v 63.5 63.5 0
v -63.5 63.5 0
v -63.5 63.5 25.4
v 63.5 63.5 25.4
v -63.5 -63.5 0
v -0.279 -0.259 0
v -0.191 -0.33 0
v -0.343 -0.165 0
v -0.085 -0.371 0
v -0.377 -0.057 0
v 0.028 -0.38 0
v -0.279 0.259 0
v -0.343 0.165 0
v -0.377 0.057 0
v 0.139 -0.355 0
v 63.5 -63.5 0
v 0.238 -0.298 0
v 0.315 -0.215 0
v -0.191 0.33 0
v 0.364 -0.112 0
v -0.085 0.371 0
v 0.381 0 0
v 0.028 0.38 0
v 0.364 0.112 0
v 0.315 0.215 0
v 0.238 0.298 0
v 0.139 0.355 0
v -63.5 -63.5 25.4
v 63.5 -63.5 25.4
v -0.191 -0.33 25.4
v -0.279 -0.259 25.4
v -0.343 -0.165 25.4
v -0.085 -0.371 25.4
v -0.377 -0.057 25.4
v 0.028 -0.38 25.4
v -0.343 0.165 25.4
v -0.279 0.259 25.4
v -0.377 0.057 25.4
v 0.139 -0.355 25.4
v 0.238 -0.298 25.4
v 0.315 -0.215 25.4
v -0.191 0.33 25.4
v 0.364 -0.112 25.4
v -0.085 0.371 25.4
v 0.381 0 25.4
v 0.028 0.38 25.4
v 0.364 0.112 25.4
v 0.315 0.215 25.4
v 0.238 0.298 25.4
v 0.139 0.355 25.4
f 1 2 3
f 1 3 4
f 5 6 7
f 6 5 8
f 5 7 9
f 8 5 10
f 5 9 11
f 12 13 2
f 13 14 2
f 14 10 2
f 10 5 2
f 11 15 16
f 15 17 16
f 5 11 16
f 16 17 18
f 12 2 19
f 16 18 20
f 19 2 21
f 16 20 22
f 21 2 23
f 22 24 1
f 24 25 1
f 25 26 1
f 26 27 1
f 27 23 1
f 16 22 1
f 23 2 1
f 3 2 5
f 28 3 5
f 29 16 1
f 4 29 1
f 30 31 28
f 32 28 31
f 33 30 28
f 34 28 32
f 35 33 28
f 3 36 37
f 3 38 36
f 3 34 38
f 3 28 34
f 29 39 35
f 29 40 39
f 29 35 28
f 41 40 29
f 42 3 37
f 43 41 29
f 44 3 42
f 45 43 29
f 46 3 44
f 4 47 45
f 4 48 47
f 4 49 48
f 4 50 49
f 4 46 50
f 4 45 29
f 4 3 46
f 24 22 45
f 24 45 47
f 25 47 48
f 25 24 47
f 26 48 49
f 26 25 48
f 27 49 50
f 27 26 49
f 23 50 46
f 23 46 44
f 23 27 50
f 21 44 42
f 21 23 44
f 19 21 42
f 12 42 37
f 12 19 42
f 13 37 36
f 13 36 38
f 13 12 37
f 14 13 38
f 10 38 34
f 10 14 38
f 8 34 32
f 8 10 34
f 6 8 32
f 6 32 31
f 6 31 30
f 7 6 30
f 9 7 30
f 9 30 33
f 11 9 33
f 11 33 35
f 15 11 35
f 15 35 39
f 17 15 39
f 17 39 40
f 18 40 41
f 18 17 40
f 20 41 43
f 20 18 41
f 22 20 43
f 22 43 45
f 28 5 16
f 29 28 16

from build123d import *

# Parameters (mm, degrees)
F0_W     = 127
F0_H     = 25.4
F0_H_2   = 76.2
F0_R     = 0.381
F1_DEPTH = 25.4


with BuildPart() as f1:
    # F0 (on Top) → F1 (new body)
    with BuildSketch(Plane.XY):
        with Locations((0, 50.8)):
            Rectangle(F0_W, F0_H)
        Rectangle(F0_W, F0_H_2)
        Circle(F0_R, mode=Mode.SUBTRACT)
        with Locations((0, -50.8)):
            Rectangle(F0_W, F0_H)
    extrude(amount=F1_DEPTH)


solid = f1.part
